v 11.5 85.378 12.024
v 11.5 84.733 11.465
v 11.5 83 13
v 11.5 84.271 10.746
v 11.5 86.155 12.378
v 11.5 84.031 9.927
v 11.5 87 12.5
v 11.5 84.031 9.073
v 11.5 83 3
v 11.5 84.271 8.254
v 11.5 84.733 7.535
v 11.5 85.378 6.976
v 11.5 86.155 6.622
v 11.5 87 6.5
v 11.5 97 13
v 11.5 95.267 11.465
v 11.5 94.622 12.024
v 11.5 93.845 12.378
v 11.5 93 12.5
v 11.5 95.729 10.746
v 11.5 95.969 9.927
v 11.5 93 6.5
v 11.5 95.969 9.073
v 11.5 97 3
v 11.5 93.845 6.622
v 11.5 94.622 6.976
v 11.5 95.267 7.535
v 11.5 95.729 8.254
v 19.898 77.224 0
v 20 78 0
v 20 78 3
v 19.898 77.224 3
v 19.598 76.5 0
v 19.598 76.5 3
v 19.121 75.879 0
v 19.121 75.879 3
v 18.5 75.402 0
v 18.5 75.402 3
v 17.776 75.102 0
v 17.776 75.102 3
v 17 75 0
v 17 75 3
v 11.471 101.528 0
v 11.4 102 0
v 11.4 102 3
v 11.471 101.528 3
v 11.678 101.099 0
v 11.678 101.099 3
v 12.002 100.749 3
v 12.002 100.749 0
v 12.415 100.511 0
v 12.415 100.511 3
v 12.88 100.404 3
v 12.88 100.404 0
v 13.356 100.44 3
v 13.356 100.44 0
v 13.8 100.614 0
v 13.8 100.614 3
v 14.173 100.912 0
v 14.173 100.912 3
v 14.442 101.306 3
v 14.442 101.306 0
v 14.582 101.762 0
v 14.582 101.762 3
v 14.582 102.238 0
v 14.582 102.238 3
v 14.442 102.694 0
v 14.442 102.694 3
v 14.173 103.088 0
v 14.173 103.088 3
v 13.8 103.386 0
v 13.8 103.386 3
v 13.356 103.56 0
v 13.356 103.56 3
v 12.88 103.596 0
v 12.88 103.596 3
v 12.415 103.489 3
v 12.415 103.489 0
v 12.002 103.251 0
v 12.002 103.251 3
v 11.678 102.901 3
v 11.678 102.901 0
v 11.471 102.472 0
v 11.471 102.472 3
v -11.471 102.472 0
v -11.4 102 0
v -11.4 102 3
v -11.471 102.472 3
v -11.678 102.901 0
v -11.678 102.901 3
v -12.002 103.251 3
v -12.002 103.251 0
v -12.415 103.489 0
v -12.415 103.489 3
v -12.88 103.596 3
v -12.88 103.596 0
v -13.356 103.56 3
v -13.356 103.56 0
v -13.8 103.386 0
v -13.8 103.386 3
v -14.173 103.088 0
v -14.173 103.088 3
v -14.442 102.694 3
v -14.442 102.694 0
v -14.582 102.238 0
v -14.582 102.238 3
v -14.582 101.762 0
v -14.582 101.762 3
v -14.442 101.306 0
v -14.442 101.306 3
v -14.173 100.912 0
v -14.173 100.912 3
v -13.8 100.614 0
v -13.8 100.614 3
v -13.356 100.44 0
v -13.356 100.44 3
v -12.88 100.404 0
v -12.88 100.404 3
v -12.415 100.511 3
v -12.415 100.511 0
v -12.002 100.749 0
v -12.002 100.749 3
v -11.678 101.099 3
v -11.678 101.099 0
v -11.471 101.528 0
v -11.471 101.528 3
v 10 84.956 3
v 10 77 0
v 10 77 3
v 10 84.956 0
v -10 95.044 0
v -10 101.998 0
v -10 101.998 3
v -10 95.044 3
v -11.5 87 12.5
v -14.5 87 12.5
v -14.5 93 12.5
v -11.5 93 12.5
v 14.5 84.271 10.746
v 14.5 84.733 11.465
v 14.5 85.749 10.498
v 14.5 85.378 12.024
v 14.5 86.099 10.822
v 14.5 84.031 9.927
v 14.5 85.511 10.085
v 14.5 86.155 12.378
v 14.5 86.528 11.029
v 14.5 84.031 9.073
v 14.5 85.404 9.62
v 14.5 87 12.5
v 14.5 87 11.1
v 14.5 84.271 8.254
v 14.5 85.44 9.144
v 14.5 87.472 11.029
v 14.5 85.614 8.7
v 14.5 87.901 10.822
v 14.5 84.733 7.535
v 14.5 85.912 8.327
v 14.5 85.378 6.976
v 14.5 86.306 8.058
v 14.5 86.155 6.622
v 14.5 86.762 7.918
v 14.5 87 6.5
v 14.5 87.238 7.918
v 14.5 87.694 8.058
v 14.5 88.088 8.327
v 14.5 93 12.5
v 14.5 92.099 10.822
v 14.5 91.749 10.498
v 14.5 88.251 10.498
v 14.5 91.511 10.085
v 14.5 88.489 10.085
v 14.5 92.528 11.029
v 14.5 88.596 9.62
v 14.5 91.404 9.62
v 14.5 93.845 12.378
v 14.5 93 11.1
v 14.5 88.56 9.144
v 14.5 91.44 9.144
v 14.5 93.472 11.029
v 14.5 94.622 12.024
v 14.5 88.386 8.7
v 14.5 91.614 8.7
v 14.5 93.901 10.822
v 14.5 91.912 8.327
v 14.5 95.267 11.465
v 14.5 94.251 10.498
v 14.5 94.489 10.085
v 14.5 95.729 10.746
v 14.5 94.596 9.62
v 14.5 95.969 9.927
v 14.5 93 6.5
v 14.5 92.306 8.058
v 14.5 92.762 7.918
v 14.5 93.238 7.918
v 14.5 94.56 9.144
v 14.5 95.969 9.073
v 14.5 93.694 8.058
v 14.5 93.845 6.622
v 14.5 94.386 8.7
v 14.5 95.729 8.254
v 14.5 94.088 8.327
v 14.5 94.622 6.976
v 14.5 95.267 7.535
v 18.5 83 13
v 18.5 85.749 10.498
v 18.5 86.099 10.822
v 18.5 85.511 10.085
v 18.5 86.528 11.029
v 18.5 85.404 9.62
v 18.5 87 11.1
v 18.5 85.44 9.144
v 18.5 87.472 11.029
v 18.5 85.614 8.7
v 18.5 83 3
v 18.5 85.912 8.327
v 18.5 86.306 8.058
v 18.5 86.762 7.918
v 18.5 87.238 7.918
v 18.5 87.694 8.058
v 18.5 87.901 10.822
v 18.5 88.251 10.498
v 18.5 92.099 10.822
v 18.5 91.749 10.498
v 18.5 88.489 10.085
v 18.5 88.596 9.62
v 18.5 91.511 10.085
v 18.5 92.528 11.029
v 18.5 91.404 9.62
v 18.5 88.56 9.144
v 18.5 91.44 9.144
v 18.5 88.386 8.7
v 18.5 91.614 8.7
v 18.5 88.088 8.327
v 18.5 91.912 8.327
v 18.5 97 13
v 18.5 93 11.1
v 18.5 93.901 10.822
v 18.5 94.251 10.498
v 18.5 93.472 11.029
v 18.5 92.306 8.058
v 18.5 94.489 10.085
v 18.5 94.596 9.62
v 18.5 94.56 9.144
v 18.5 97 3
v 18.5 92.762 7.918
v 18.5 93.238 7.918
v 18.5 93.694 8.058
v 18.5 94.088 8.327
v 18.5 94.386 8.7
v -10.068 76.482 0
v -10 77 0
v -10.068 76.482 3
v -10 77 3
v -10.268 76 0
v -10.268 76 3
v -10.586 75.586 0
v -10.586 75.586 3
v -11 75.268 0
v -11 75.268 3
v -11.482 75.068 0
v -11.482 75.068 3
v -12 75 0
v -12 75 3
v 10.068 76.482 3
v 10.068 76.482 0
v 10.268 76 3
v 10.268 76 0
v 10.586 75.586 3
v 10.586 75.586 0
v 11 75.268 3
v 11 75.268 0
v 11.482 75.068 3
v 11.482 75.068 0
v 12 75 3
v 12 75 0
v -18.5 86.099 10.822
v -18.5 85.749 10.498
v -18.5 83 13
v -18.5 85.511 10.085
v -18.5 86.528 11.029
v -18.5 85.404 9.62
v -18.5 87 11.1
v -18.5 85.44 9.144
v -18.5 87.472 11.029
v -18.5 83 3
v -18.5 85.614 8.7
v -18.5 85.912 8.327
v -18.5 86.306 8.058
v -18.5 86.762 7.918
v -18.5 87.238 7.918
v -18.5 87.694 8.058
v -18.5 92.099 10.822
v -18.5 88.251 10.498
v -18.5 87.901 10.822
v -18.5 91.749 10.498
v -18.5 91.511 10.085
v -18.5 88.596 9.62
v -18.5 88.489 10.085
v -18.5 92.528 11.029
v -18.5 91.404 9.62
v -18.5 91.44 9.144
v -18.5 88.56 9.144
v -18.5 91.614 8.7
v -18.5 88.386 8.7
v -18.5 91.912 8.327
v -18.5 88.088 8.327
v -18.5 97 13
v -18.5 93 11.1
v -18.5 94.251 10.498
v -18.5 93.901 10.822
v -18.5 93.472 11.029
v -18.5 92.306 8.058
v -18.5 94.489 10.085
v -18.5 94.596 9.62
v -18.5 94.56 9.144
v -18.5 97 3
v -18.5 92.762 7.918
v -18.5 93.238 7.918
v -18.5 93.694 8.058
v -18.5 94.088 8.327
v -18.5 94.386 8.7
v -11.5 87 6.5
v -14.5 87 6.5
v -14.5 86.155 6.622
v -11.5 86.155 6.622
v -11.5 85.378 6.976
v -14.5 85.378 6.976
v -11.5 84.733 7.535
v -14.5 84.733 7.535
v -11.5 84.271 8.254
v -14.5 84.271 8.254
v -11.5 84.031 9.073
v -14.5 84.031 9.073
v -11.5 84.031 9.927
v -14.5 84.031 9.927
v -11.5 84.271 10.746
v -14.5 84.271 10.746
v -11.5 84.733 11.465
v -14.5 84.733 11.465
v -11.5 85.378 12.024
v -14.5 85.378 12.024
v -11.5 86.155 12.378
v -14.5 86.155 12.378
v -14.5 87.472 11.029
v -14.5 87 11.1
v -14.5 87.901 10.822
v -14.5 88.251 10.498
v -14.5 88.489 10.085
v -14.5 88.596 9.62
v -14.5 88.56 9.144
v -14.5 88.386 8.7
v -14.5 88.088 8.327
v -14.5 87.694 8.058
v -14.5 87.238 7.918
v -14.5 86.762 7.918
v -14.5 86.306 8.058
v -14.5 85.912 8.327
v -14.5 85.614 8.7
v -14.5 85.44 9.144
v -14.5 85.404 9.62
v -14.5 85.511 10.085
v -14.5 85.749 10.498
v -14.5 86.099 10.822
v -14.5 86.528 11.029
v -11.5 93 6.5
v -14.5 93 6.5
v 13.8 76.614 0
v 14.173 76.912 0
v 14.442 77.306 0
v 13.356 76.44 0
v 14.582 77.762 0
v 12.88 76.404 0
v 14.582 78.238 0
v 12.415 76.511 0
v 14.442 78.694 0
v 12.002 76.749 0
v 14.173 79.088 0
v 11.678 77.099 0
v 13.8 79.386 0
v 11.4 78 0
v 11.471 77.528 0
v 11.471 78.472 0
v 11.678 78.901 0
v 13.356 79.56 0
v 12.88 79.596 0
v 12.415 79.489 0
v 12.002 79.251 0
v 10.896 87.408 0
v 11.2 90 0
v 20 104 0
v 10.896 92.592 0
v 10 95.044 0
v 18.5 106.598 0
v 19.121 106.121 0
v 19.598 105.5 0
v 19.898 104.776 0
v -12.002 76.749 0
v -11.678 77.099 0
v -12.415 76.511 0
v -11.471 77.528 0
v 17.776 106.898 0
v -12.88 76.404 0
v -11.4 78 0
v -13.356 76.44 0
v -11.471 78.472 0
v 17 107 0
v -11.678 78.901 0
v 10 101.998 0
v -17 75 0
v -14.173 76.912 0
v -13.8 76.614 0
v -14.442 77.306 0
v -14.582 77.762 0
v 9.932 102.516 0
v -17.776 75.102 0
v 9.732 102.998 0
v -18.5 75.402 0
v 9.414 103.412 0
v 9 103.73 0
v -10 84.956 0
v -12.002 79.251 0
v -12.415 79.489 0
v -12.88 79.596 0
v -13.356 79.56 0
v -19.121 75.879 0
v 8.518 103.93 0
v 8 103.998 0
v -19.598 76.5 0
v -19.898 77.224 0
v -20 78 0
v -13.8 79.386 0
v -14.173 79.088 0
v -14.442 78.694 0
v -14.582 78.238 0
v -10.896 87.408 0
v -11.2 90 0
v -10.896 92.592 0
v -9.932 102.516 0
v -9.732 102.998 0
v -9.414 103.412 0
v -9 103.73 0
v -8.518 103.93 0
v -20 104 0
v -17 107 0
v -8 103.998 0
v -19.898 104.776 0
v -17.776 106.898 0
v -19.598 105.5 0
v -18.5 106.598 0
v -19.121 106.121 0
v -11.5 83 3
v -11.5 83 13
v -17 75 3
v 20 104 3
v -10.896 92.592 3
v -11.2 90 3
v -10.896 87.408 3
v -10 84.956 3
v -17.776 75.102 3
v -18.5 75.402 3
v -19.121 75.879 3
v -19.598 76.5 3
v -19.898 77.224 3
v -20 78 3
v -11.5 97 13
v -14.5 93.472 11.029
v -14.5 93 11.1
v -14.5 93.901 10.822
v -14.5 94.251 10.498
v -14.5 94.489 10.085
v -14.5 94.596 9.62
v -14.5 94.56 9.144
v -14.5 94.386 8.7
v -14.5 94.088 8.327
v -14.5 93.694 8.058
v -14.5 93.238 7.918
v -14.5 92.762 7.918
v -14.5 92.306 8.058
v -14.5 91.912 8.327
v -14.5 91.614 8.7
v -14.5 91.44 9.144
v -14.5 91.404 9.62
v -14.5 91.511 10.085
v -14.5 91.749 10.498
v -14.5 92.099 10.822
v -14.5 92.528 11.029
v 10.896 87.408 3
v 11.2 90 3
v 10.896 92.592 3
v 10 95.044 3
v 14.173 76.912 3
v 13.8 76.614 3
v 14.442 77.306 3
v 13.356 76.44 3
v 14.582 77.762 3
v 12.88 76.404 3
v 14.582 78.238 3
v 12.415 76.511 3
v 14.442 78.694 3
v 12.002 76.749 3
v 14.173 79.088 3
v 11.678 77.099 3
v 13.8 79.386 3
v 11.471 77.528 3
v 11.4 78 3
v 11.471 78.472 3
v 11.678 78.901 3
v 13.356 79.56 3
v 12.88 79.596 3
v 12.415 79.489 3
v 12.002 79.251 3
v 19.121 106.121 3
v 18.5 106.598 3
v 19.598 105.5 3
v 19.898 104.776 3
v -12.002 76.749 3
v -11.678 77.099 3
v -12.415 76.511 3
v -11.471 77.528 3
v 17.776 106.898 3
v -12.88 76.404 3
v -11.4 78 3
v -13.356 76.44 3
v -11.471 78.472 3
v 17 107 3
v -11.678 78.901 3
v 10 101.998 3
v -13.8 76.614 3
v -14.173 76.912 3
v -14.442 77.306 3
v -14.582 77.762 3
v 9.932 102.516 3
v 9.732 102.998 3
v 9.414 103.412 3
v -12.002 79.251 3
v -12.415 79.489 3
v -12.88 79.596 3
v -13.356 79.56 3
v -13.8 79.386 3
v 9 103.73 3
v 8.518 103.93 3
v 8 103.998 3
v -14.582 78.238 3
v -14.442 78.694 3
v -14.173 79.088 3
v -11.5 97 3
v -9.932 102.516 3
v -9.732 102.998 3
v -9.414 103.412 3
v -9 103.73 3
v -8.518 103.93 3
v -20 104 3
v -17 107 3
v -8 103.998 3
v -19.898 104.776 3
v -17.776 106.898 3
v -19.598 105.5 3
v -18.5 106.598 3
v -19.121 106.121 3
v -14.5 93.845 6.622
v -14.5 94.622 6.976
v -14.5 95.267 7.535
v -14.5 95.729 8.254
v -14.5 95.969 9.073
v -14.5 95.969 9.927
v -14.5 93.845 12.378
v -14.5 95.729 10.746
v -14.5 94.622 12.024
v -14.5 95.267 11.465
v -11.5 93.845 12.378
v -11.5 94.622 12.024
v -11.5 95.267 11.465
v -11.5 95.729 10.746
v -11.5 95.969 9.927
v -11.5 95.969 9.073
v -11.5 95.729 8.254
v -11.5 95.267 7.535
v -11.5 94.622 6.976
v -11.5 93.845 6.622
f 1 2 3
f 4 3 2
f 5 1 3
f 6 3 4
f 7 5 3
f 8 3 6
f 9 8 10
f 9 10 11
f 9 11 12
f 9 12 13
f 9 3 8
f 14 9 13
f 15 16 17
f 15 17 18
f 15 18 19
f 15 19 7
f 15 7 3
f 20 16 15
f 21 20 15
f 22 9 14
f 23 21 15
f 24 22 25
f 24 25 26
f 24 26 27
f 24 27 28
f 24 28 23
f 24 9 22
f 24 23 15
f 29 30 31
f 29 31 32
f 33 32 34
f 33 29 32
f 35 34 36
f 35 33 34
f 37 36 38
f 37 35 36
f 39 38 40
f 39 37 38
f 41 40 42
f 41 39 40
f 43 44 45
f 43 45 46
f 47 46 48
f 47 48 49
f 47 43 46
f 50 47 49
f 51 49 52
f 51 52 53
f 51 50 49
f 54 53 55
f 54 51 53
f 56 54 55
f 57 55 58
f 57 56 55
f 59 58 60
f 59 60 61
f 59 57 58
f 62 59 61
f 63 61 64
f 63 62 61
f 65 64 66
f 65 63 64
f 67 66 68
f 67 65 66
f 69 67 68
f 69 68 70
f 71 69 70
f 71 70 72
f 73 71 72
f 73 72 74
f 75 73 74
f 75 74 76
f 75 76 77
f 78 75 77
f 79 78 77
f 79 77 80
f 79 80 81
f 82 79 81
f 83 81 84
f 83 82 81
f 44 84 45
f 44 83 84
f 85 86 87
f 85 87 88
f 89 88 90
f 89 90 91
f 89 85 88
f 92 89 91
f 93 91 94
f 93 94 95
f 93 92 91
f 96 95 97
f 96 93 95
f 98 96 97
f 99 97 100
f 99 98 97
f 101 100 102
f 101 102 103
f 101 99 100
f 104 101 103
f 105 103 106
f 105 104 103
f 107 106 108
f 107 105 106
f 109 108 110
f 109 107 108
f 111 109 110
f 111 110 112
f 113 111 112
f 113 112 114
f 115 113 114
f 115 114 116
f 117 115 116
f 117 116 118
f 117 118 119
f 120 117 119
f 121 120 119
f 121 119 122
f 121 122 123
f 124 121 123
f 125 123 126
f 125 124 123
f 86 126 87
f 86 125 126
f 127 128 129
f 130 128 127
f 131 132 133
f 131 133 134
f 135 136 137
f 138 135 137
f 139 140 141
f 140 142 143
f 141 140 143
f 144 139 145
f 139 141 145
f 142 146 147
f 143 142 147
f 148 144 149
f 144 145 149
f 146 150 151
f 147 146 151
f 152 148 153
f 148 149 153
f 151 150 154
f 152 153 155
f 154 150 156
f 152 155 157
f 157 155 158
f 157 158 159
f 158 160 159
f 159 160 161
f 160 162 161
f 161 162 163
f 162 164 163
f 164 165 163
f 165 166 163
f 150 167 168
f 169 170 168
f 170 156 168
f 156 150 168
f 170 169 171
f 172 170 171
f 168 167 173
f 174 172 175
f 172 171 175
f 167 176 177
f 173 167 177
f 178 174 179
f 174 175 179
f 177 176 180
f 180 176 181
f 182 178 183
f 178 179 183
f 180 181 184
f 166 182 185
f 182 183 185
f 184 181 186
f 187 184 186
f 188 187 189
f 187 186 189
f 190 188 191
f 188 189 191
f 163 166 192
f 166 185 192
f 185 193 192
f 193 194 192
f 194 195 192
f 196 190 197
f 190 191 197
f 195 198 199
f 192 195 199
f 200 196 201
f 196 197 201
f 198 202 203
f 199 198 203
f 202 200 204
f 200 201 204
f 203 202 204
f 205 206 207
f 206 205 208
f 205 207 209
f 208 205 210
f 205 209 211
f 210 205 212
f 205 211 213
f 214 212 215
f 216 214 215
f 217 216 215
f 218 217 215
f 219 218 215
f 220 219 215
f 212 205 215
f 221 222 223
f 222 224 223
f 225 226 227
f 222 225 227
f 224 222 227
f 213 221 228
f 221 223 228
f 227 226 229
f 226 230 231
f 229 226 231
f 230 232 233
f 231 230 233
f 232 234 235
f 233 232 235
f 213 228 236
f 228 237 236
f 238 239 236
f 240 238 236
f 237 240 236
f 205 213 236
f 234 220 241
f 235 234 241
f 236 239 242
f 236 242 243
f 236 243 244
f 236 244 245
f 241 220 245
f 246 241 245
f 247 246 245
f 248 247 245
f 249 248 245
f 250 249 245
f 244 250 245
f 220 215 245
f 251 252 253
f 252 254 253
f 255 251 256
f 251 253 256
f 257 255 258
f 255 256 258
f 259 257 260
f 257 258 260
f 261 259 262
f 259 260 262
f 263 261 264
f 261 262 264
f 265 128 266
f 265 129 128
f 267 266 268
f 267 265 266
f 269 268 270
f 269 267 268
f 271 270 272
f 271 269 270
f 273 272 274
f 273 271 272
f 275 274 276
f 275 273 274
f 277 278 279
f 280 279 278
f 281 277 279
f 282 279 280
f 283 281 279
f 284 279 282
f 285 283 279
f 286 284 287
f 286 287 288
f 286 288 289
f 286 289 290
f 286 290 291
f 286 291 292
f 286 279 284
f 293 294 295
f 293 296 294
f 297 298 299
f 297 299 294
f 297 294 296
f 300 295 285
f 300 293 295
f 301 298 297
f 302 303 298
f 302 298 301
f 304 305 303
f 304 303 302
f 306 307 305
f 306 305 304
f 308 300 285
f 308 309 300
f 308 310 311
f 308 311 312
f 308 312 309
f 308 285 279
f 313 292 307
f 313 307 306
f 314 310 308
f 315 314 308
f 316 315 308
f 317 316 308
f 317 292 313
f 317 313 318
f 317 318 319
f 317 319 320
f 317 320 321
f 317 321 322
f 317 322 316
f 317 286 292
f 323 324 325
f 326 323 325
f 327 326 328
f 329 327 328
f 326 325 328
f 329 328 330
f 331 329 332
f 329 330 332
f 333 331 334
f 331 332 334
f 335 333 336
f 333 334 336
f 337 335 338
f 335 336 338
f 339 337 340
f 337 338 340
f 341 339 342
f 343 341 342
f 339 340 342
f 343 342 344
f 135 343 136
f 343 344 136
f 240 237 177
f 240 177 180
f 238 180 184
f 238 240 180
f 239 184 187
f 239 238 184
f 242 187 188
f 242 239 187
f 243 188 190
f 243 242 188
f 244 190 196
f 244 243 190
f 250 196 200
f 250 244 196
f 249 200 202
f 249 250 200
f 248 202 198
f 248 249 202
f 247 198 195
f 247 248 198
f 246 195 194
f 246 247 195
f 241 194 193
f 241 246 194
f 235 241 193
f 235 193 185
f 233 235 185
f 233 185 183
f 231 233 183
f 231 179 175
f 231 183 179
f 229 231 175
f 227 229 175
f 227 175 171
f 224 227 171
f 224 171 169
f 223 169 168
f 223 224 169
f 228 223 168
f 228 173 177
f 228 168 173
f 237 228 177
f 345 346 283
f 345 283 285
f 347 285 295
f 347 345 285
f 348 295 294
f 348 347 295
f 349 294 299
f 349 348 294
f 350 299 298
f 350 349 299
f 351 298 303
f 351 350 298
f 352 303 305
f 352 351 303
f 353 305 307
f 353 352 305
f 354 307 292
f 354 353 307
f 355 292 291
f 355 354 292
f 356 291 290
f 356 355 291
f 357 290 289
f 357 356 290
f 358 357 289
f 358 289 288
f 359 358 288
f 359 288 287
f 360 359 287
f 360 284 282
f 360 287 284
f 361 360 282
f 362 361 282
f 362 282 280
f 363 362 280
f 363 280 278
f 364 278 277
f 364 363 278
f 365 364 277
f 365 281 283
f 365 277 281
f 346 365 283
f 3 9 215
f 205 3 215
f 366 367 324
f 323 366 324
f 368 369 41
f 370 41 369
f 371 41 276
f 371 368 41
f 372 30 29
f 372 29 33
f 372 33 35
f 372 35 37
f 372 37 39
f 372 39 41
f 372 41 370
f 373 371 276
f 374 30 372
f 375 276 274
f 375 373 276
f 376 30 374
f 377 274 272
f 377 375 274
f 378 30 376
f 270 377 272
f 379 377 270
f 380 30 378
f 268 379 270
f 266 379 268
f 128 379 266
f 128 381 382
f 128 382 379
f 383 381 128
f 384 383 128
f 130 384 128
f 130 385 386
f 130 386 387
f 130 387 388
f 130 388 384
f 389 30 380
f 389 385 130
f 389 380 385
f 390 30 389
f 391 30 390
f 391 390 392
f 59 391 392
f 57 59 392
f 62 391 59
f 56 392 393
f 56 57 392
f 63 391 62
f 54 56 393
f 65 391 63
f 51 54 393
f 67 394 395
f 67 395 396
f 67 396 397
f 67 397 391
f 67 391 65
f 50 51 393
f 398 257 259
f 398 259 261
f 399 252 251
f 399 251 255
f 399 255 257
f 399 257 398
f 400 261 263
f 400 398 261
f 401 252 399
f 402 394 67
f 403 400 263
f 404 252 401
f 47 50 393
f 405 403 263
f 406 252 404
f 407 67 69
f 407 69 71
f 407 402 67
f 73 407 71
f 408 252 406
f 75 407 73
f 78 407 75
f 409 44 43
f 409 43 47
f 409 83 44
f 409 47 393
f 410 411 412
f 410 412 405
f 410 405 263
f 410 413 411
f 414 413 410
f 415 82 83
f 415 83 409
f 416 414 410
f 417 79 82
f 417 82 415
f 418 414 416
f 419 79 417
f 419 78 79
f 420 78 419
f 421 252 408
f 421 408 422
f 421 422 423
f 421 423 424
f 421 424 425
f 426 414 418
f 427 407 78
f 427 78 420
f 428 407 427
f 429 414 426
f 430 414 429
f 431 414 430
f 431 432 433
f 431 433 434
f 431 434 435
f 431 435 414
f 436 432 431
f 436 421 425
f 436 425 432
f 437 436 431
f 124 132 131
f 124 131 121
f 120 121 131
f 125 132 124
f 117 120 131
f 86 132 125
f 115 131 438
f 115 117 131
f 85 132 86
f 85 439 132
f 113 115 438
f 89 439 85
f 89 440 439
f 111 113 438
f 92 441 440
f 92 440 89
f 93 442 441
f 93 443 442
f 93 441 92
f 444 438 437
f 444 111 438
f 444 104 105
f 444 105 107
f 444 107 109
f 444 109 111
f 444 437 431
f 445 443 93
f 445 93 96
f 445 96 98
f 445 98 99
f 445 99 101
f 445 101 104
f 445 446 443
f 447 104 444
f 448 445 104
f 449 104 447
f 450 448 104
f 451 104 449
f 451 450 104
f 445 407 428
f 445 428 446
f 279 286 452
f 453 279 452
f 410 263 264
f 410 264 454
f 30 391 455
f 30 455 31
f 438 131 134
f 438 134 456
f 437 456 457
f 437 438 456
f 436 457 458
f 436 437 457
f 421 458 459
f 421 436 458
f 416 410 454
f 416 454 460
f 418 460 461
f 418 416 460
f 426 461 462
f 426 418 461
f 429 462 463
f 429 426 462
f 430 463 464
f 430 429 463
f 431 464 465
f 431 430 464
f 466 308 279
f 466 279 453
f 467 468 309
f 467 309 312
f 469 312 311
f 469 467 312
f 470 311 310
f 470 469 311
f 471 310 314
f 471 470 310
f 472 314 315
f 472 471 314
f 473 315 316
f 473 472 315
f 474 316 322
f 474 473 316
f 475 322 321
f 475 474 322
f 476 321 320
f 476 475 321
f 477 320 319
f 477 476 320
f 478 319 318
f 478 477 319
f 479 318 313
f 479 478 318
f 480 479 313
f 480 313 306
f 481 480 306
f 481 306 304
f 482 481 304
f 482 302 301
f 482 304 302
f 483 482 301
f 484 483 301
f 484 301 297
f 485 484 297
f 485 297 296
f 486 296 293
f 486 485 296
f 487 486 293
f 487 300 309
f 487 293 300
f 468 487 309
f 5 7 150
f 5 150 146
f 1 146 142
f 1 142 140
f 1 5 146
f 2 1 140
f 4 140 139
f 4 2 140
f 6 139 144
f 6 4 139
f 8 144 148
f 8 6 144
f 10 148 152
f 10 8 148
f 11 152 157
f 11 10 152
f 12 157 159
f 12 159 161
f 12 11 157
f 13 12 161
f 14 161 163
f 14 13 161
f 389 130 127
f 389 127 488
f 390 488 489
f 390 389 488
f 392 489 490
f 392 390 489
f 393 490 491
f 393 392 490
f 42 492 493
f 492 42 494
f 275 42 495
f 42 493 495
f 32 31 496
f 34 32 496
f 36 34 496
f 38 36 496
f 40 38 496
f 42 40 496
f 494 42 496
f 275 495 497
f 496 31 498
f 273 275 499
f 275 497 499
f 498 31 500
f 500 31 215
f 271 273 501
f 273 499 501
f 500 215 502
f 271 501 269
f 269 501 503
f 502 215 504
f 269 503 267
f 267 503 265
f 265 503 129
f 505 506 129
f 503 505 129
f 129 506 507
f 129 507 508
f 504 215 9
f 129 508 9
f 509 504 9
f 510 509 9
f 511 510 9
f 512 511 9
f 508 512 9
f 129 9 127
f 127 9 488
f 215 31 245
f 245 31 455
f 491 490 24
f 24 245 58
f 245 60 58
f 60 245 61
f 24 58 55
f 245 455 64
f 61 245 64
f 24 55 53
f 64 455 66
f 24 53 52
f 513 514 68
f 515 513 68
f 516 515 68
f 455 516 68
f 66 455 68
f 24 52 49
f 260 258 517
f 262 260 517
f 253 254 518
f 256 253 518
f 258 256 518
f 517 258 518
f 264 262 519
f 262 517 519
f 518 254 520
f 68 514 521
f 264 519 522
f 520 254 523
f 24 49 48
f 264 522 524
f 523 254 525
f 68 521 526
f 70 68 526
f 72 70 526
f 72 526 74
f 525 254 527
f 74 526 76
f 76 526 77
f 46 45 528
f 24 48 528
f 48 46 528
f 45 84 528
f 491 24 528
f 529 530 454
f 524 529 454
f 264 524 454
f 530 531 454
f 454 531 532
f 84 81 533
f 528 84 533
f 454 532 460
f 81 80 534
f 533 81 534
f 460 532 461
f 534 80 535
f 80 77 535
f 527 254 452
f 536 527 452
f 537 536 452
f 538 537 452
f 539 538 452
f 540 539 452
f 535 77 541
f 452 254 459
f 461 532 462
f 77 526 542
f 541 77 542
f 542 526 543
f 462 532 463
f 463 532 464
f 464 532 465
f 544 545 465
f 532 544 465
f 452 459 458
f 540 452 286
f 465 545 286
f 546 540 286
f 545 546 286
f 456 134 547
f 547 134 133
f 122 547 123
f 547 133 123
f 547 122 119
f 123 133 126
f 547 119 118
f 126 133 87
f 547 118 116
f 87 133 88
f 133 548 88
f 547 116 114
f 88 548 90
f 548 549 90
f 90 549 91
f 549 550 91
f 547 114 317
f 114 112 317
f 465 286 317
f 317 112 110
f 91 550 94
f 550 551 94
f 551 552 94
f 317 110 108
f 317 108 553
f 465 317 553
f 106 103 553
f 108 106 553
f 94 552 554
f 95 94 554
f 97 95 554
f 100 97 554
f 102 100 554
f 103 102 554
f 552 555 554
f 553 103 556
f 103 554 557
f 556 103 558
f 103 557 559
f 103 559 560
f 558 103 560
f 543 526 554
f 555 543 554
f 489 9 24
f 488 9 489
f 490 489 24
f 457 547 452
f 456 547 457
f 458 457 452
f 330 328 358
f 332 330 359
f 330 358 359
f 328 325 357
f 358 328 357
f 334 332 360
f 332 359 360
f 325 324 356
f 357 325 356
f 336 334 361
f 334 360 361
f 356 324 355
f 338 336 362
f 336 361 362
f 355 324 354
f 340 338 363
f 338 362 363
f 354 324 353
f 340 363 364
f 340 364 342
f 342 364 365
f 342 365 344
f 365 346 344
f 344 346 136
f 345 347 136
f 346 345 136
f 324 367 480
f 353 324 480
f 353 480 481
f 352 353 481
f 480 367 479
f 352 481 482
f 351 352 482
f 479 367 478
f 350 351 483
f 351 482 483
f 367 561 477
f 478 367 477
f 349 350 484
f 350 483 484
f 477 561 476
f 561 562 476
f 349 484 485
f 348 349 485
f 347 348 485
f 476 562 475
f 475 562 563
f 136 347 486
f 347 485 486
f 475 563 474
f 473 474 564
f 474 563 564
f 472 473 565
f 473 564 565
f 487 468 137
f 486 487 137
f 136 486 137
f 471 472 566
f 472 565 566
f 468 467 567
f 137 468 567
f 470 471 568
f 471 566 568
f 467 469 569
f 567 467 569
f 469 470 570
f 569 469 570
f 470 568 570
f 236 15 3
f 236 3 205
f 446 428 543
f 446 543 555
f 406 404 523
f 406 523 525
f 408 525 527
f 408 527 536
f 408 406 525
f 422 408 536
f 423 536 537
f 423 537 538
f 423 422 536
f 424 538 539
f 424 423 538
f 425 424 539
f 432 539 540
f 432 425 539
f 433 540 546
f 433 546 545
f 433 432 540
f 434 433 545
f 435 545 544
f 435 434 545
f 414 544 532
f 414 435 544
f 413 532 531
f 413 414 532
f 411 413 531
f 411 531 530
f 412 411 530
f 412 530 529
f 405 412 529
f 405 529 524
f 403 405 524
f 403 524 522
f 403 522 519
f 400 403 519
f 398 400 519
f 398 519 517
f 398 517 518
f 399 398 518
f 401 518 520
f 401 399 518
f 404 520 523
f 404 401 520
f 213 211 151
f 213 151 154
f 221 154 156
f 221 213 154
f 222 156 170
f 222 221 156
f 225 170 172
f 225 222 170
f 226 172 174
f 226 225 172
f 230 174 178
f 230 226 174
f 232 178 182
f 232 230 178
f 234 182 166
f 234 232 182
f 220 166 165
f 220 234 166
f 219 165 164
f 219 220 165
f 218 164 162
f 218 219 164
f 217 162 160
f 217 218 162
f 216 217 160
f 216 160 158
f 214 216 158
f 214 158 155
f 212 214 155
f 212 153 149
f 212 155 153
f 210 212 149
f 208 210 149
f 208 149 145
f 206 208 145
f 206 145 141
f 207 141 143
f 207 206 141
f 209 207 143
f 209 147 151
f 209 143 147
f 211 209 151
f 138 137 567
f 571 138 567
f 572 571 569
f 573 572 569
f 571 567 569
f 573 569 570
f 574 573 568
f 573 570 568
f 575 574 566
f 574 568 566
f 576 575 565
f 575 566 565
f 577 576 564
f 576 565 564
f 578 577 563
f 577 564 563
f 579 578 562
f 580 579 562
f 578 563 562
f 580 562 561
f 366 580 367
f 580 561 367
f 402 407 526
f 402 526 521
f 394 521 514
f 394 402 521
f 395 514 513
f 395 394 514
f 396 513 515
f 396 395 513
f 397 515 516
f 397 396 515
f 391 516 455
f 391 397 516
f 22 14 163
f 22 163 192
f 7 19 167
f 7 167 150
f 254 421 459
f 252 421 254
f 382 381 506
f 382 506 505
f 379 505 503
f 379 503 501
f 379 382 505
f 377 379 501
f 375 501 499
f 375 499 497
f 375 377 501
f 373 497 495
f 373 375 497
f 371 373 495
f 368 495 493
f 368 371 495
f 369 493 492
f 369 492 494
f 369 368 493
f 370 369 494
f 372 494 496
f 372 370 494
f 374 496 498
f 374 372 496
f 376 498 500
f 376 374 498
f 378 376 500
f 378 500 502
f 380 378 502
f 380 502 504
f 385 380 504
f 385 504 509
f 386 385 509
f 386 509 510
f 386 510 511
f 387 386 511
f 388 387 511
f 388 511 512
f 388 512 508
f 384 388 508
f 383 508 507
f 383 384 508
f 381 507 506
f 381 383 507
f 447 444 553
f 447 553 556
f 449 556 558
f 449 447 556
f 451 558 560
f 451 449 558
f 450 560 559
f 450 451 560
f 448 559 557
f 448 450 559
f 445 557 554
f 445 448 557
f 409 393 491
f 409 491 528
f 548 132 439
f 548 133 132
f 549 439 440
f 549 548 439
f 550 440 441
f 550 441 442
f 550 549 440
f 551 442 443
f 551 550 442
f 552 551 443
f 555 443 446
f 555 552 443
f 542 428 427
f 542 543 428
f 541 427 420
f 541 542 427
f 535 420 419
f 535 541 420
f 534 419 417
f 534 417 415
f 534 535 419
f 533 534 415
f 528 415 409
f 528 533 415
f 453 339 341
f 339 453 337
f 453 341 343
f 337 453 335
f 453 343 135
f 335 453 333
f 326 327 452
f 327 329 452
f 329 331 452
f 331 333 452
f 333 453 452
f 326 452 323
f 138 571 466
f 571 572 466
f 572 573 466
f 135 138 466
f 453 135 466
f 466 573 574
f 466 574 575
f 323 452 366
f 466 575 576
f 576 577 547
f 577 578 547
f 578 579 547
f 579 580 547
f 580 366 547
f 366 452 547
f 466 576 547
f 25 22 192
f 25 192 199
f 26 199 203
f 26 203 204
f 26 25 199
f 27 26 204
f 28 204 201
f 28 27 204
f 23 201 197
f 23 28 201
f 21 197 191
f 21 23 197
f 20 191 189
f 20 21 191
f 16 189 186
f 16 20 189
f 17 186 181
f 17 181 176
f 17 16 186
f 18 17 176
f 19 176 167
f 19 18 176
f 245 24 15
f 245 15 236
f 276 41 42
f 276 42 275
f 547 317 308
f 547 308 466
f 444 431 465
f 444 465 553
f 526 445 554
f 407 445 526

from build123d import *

# Parameters (mm, degrees)
SKETCH_1_R               = 1.6
EXTRUDE_1_DEPTH          = 3
SKETCH_2_W               = 7
SKETCH_2_H               = 14
EXTRUDE_2_DEPTH          = 10
CUT_EXTRUDE_1_DEPTH      = 115.456323547
CUT_EXTRUDE_1_DEPTH_BACK = 115.456323547
SKETCH_4_R               = 1.6
FILLET_1_R               = 2
CUT_EXTRUDE_2_DEPTH      = 3
CUT_EXTRUDE_START        = -3
CUT_EXTRUDE_3_DEPTH      = 3


with BuildPart() as part:
    # 草图1 → 凸台-拉伸1 (new body)
    with BuildSketch(Plane.XY):
        with BuildLine():
            Line((-10, 103.998111102), (-10, 95.043808085))
            ThreePointArc((-10, 95.043808085), (-11.2, 90), (-10, 84.956191915))
            Line((-10, 84.956191915), (-10, 75))
            Line((-10, 75), (-17, 75))
            ThreePointArc((-17, 75), (-19.121320344, 75.878679656), (-20, 78))
            Line((-20, 78), (-20, 104))
            ThreePointArc((-20, 104), (-19.121320344, 106.121320344), (-17, 107))
            Line((-17, 107), (17, 107))
            ThreePointArc((17, 107), (19.121320344, 106.121320344), (20, 104))
            Line((20, 104), (20, 78))
            ThreePointArc((20, 78), (19.121320344, 75.878679656), (17, 75))
            Line((17, 75), (10, 75))
            Line((10, 75), (10, 84.956191915))
            ThreePointArc((10, 84.956191915), (11.2, 90), (10, 95.043808085))
            Line((10, 95.043808085), (10, 103.998111102))
            Line((10, 103.998111102), (-10, 103.998111102))
        make_face()
        with Locations((-13, 102)):
            Circle(SKETCH_1_R, mode=Mode.SUBTRACT)
        with Locations((-13, 78)):
            Circle(SKETCH_1_R, mode=Mode.SUBTRACT)
        with Locations(Location((13, 102, 0), (0, 0, 180))):
            Circle(SKETCH_1_R, mode=Mode.SUBTRACT)
        with Locations(Location((13, 78, 0), (0, 0, 180))):
            Circle(SKETCH_1_R, mode=Mode.SUBTRACT)
    extrude(amount=EXTRUDE_1_DEPTH)

    # 草图2 → 凸台-拉伸2 (add)
    with BuildSketch(Plane.XY.offset(3)):
        with Locations((-15, 90)):
            Rectangle(SKETCH_2_W, SKETCH_2_H)
        with Locations((15, 90)):
            Rectangle(SKETCH_2_W, SKETCH_2_H)
    extrude(amount=EXTRUDE_2_DEPTH)

    # 草图4 → 切除-拉伸1 (cut, two sides: drawn at the far end of the back side and taken through both)
    with BuildSketch(Plane.ZY.offset(18.5).offset(-CUT_EXTRUDE_1_DEPTH_BACK)):
        with Locations((9.5, 93)):
            Circle(SKETCH_4_R)
        with Locations((9.5, 87)):
            Circle(SKETCH_4_R)
    extrude(amount=CUT_EXTRUDE_1_DEPTH + CUT_EXTRUDE_1_DEPTH_BACK, mode=Mode.SUBTRACT)

    # 圆角1
    fillet_1_edges = [part.edges().sort_by_distance(p)[0] for p in [
        (-10, 75, 1.5),
        (10, 75, 1.5),
        (10, 103.998111102, 1.5),
        (-10, 103.998111102, 1.5),
    ]]
    fillet(fillet_1_edges, radius=FILLET_1_R)

    # 草图5 → 切除-拉伸2 (cut)
    with BuildSketch(Plane.ZY.offset(-11.5)):
        with BuildLine():
            Line((12.5, 93), (12.5, 87))
            ThreePointArc((12.5, 87), (9.5, 84), (6.5, 87))
            Line((6.5, 87), (6.5, 93))
            ThreePointArc((6.5, 93), (9.5, 96), (12.5, 93))
        make_face()
    extrude(amount=-CUT_EXTRUDE_2_DEPTH, mode=Mode.SUBTRACT)

    # 草图6 → 切除-拉伸3 (cut)
    with BuildSketch(Plane(origin=(-11.5, 0, 0), x_dir=(0, 0, -1), z_dir=(1, 0, 0)).offset(CUT_EXTRUDE_START)):
        with BuildLine():
            Line((-6.5, 93), (-6.5, 87))
            ThreePointArc((-6.5, 87), (-9.5, 84), (-12.5, 87))
            Line((-12.5, 87), (-12.5, 93))
            ThreePointArc((-12.5, 93), (-9.5, 96), (-6.5, 93))
        make_face()
    extrude(amount=CUT_EXTRUDE_3_DEPTH, mode=Mode.SUBTRACT)


solid = part.part
